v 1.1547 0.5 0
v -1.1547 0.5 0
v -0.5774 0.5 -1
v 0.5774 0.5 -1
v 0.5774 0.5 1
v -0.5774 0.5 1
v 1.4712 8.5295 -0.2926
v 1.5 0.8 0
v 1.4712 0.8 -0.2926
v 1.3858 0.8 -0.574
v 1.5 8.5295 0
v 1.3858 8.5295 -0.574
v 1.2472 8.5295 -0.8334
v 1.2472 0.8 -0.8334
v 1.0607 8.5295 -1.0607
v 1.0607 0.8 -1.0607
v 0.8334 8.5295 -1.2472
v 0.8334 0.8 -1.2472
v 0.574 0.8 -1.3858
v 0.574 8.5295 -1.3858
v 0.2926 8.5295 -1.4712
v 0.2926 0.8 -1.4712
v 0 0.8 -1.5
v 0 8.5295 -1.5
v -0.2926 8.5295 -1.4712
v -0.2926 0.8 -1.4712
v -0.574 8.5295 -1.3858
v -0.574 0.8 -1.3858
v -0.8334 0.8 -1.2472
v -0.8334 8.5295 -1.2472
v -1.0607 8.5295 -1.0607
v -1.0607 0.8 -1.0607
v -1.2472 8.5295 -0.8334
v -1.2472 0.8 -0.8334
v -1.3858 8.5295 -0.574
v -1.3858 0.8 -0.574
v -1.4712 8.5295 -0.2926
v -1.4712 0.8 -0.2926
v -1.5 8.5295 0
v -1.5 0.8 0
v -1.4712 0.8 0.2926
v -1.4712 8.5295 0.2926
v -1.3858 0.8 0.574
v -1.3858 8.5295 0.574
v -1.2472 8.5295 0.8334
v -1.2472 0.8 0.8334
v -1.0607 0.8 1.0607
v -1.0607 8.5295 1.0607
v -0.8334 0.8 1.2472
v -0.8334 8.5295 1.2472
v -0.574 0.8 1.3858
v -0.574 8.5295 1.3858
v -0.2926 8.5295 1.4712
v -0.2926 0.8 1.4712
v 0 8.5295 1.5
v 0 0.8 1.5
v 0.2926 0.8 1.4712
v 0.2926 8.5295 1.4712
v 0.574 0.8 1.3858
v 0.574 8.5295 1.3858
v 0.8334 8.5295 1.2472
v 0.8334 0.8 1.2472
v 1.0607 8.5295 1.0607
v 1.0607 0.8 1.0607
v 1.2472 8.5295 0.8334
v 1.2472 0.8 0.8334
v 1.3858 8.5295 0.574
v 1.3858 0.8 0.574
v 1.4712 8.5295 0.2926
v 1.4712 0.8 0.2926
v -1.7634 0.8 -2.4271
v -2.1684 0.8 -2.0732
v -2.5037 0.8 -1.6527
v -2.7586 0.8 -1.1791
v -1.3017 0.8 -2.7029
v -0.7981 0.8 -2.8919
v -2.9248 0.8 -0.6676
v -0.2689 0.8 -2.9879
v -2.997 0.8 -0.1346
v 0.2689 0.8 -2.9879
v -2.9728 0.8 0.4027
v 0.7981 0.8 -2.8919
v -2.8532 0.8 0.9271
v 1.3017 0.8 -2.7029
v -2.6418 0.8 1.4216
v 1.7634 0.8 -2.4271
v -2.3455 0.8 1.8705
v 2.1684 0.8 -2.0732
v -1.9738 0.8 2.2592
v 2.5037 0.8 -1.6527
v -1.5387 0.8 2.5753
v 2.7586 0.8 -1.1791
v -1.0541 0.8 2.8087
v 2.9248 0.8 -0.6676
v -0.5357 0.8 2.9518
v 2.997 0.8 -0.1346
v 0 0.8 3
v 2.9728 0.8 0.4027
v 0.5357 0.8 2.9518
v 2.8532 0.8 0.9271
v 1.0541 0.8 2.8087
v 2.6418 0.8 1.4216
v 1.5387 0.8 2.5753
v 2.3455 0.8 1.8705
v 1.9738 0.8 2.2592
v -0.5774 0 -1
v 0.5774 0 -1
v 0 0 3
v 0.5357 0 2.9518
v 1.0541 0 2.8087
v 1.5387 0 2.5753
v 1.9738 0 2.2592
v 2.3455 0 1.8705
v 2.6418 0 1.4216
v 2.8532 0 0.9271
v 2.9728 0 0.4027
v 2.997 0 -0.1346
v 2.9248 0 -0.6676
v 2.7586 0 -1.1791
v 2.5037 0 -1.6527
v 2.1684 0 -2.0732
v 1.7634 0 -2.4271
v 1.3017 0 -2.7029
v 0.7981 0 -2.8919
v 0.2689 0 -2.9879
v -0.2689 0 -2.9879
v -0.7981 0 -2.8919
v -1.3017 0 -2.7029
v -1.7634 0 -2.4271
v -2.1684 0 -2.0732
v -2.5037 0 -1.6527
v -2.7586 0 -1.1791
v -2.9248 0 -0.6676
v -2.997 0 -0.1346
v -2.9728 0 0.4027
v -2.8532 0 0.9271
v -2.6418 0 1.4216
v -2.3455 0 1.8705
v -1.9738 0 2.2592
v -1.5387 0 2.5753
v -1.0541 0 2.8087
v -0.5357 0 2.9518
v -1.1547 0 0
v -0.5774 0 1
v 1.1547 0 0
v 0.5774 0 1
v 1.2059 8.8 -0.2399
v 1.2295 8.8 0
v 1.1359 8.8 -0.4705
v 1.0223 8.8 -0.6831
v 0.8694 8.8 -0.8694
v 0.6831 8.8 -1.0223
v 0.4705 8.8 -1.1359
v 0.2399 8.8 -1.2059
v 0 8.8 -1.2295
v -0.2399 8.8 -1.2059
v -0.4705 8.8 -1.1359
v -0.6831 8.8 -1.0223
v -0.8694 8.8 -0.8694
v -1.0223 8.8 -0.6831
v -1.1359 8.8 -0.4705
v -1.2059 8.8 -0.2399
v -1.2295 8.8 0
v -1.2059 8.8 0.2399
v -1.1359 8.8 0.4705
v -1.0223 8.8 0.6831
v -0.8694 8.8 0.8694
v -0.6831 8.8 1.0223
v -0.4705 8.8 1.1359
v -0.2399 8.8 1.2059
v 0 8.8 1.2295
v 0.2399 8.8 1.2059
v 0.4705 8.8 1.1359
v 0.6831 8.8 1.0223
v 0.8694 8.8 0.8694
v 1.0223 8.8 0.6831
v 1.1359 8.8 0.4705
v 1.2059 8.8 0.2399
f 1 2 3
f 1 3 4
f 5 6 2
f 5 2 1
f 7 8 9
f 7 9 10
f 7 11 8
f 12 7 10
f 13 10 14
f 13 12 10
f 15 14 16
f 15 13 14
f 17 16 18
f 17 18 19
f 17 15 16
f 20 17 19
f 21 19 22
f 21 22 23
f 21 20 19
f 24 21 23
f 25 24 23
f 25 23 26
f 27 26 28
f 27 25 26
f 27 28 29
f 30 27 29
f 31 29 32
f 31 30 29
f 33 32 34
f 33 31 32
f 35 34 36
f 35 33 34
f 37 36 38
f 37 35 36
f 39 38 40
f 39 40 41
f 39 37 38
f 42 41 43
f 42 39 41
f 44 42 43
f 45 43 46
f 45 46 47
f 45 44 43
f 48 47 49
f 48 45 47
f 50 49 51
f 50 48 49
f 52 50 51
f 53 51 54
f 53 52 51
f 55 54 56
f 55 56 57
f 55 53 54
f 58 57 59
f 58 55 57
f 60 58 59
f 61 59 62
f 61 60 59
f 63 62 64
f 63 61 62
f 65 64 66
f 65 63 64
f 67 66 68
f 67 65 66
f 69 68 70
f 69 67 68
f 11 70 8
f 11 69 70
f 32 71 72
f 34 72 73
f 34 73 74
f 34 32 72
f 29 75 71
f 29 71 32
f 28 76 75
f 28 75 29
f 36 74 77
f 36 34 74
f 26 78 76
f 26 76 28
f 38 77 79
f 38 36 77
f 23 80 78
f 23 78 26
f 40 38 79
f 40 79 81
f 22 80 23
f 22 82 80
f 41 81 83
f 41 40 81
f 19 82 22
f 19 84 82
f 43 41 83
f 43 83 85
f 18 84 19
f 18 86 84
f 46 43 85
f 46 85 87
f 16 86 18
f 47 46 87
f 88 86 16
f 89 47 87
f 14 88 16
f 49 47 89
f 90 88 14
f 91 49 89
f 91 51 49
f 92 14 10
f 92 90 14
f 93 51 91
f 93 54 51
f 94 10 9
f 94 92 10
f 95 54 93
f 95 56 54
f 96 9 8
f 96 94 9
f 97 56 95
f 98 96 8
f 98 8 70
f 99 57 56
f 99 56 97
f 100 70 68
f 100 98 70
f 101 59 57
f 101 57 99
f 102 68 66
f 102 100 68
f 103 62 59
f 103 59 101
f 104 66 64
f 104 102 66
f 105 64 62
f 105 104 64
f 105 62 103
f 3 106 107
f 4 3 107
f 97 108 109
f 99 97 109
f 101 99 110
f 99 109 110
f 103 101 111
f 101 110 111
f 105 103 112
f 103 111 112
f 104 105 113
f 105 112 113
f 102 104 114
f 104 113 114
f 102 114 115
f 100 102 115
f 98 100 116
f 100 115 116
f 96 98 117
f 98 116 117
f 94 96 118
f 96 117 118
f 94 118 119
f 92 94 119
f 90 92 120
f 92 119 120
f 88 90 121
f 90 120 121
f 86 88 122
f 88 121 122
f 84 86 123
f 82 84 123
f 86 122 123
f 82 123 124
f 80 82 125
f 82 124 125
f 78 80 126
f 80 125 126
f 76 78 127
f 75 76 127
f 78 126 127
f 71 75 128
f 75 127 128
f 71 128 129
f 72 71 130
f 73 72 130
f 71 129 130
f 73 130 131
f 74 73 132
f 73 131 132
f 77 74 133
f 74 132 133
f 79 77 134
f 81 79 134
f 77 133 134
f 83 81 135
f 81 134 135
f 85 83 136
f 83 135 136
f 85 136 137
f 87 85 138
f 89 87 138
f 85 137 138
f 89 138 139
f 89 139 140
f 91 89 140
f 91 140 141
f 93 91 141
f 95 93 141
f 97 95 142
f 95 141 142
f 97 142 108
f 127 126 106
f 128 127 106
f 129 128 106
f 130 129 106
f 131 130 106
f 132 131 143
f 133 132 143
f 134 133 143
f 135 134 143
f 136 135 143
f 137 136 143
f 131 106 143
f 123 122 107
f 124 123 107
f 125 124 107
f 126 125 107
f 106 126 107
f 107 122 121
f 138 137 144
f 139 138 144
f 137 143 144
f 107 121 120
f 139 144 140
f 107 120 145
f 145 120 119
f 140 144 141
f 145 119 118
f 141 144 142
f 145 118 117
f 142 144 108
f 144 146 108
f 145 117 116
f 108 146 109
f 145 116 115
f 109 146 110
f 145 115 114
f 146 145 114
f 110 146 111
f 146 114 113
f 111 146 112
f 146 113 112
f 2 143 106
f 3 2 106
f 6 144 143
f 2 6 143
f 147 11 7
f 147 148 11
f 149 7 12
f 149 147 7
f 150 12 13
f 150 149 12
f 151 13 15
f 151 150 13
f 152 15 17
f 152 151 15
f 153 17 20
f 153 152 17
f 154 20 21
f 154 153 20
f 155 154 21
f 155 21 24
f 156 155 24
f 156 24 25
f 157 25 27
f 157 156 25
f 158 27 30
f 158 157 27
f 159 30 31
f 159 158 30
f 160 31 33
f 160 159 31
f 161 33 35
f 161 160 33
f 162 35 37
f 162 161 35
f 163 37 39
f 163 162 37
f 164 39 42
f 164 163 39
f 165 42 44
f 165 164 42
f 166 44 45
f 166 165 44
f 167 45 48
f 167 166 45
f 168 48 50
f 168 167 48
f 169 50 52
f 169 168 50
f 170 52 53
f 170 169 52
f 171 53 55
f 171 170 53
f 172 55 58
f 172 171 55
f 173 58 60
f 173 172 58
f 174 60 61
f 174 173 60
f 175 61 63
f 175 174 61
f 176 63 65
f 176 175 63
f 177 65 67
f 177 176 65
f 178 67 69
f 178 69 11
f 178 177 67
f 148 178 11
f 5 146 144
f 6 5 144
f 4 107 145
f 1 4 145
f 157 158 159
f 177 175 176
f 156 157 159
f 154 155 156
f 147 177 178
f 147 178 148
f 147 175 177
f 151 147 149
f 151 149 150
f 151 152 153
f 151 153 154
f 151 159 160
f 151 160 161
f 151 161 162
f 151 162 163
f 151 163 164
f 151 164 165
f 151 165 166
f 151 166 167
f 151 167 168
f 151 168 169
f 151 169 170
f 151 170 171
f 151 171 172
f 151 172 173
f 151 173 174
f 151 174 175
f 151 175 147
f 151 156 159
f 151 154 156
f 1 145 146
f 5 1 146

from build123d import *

# Parameters (mm, degrees)
SKETCH_1_R          = 3
EXTRUDE_1_DEPTH     = 0.8
CUT_EXTRUDE_1_DEPTH = 0.5


# Read off the part's stored shape, not the designer's step: M3 机械螺纹 螺柱3
with BuildPart() as part:
    # 草图1 → 凸台-拉伸1 (new body)
    with BuildSketch(Plane(origin=(0, 0, 0), x_dir=(1, 0, 0), z_dir=(0, 1, 0))):
        with Locations(Location((0, 0, 0), (0, 0, 270))):
            Circle(SKETCH_1_R)
    extrude(amount=EXTRUDE_1_DEPTH)

    # M3 机械螺纹 螺柱3 outline → M3 机械螺纹 螺柱3 (revolve)
    with BuildSketch(Plane.XY):
        Polygon((1.2295, 8.8), (0, 8.8), (0, 0.8), (1.5, 0.8), (1.5, 8.5295), align=None)
    revolve(axis=Axis((0, 0, 0), (0, 1, 0)))

    # 草图8 → 切除-拉伸1 (cut)
    with BuildSketch(Plane.XZ):
        Polygon((1.154700538, 0), (0.577350269, 1), (-0.577350269, 1), (-1.154700538, 0), (-0.577350269, -1), (0.577350269, -1), align=None)
    extrude(amount=-CUT_EXTRUDE_1_DEPTH, mode=Mode.SUBTRACT)


solid = part.part
